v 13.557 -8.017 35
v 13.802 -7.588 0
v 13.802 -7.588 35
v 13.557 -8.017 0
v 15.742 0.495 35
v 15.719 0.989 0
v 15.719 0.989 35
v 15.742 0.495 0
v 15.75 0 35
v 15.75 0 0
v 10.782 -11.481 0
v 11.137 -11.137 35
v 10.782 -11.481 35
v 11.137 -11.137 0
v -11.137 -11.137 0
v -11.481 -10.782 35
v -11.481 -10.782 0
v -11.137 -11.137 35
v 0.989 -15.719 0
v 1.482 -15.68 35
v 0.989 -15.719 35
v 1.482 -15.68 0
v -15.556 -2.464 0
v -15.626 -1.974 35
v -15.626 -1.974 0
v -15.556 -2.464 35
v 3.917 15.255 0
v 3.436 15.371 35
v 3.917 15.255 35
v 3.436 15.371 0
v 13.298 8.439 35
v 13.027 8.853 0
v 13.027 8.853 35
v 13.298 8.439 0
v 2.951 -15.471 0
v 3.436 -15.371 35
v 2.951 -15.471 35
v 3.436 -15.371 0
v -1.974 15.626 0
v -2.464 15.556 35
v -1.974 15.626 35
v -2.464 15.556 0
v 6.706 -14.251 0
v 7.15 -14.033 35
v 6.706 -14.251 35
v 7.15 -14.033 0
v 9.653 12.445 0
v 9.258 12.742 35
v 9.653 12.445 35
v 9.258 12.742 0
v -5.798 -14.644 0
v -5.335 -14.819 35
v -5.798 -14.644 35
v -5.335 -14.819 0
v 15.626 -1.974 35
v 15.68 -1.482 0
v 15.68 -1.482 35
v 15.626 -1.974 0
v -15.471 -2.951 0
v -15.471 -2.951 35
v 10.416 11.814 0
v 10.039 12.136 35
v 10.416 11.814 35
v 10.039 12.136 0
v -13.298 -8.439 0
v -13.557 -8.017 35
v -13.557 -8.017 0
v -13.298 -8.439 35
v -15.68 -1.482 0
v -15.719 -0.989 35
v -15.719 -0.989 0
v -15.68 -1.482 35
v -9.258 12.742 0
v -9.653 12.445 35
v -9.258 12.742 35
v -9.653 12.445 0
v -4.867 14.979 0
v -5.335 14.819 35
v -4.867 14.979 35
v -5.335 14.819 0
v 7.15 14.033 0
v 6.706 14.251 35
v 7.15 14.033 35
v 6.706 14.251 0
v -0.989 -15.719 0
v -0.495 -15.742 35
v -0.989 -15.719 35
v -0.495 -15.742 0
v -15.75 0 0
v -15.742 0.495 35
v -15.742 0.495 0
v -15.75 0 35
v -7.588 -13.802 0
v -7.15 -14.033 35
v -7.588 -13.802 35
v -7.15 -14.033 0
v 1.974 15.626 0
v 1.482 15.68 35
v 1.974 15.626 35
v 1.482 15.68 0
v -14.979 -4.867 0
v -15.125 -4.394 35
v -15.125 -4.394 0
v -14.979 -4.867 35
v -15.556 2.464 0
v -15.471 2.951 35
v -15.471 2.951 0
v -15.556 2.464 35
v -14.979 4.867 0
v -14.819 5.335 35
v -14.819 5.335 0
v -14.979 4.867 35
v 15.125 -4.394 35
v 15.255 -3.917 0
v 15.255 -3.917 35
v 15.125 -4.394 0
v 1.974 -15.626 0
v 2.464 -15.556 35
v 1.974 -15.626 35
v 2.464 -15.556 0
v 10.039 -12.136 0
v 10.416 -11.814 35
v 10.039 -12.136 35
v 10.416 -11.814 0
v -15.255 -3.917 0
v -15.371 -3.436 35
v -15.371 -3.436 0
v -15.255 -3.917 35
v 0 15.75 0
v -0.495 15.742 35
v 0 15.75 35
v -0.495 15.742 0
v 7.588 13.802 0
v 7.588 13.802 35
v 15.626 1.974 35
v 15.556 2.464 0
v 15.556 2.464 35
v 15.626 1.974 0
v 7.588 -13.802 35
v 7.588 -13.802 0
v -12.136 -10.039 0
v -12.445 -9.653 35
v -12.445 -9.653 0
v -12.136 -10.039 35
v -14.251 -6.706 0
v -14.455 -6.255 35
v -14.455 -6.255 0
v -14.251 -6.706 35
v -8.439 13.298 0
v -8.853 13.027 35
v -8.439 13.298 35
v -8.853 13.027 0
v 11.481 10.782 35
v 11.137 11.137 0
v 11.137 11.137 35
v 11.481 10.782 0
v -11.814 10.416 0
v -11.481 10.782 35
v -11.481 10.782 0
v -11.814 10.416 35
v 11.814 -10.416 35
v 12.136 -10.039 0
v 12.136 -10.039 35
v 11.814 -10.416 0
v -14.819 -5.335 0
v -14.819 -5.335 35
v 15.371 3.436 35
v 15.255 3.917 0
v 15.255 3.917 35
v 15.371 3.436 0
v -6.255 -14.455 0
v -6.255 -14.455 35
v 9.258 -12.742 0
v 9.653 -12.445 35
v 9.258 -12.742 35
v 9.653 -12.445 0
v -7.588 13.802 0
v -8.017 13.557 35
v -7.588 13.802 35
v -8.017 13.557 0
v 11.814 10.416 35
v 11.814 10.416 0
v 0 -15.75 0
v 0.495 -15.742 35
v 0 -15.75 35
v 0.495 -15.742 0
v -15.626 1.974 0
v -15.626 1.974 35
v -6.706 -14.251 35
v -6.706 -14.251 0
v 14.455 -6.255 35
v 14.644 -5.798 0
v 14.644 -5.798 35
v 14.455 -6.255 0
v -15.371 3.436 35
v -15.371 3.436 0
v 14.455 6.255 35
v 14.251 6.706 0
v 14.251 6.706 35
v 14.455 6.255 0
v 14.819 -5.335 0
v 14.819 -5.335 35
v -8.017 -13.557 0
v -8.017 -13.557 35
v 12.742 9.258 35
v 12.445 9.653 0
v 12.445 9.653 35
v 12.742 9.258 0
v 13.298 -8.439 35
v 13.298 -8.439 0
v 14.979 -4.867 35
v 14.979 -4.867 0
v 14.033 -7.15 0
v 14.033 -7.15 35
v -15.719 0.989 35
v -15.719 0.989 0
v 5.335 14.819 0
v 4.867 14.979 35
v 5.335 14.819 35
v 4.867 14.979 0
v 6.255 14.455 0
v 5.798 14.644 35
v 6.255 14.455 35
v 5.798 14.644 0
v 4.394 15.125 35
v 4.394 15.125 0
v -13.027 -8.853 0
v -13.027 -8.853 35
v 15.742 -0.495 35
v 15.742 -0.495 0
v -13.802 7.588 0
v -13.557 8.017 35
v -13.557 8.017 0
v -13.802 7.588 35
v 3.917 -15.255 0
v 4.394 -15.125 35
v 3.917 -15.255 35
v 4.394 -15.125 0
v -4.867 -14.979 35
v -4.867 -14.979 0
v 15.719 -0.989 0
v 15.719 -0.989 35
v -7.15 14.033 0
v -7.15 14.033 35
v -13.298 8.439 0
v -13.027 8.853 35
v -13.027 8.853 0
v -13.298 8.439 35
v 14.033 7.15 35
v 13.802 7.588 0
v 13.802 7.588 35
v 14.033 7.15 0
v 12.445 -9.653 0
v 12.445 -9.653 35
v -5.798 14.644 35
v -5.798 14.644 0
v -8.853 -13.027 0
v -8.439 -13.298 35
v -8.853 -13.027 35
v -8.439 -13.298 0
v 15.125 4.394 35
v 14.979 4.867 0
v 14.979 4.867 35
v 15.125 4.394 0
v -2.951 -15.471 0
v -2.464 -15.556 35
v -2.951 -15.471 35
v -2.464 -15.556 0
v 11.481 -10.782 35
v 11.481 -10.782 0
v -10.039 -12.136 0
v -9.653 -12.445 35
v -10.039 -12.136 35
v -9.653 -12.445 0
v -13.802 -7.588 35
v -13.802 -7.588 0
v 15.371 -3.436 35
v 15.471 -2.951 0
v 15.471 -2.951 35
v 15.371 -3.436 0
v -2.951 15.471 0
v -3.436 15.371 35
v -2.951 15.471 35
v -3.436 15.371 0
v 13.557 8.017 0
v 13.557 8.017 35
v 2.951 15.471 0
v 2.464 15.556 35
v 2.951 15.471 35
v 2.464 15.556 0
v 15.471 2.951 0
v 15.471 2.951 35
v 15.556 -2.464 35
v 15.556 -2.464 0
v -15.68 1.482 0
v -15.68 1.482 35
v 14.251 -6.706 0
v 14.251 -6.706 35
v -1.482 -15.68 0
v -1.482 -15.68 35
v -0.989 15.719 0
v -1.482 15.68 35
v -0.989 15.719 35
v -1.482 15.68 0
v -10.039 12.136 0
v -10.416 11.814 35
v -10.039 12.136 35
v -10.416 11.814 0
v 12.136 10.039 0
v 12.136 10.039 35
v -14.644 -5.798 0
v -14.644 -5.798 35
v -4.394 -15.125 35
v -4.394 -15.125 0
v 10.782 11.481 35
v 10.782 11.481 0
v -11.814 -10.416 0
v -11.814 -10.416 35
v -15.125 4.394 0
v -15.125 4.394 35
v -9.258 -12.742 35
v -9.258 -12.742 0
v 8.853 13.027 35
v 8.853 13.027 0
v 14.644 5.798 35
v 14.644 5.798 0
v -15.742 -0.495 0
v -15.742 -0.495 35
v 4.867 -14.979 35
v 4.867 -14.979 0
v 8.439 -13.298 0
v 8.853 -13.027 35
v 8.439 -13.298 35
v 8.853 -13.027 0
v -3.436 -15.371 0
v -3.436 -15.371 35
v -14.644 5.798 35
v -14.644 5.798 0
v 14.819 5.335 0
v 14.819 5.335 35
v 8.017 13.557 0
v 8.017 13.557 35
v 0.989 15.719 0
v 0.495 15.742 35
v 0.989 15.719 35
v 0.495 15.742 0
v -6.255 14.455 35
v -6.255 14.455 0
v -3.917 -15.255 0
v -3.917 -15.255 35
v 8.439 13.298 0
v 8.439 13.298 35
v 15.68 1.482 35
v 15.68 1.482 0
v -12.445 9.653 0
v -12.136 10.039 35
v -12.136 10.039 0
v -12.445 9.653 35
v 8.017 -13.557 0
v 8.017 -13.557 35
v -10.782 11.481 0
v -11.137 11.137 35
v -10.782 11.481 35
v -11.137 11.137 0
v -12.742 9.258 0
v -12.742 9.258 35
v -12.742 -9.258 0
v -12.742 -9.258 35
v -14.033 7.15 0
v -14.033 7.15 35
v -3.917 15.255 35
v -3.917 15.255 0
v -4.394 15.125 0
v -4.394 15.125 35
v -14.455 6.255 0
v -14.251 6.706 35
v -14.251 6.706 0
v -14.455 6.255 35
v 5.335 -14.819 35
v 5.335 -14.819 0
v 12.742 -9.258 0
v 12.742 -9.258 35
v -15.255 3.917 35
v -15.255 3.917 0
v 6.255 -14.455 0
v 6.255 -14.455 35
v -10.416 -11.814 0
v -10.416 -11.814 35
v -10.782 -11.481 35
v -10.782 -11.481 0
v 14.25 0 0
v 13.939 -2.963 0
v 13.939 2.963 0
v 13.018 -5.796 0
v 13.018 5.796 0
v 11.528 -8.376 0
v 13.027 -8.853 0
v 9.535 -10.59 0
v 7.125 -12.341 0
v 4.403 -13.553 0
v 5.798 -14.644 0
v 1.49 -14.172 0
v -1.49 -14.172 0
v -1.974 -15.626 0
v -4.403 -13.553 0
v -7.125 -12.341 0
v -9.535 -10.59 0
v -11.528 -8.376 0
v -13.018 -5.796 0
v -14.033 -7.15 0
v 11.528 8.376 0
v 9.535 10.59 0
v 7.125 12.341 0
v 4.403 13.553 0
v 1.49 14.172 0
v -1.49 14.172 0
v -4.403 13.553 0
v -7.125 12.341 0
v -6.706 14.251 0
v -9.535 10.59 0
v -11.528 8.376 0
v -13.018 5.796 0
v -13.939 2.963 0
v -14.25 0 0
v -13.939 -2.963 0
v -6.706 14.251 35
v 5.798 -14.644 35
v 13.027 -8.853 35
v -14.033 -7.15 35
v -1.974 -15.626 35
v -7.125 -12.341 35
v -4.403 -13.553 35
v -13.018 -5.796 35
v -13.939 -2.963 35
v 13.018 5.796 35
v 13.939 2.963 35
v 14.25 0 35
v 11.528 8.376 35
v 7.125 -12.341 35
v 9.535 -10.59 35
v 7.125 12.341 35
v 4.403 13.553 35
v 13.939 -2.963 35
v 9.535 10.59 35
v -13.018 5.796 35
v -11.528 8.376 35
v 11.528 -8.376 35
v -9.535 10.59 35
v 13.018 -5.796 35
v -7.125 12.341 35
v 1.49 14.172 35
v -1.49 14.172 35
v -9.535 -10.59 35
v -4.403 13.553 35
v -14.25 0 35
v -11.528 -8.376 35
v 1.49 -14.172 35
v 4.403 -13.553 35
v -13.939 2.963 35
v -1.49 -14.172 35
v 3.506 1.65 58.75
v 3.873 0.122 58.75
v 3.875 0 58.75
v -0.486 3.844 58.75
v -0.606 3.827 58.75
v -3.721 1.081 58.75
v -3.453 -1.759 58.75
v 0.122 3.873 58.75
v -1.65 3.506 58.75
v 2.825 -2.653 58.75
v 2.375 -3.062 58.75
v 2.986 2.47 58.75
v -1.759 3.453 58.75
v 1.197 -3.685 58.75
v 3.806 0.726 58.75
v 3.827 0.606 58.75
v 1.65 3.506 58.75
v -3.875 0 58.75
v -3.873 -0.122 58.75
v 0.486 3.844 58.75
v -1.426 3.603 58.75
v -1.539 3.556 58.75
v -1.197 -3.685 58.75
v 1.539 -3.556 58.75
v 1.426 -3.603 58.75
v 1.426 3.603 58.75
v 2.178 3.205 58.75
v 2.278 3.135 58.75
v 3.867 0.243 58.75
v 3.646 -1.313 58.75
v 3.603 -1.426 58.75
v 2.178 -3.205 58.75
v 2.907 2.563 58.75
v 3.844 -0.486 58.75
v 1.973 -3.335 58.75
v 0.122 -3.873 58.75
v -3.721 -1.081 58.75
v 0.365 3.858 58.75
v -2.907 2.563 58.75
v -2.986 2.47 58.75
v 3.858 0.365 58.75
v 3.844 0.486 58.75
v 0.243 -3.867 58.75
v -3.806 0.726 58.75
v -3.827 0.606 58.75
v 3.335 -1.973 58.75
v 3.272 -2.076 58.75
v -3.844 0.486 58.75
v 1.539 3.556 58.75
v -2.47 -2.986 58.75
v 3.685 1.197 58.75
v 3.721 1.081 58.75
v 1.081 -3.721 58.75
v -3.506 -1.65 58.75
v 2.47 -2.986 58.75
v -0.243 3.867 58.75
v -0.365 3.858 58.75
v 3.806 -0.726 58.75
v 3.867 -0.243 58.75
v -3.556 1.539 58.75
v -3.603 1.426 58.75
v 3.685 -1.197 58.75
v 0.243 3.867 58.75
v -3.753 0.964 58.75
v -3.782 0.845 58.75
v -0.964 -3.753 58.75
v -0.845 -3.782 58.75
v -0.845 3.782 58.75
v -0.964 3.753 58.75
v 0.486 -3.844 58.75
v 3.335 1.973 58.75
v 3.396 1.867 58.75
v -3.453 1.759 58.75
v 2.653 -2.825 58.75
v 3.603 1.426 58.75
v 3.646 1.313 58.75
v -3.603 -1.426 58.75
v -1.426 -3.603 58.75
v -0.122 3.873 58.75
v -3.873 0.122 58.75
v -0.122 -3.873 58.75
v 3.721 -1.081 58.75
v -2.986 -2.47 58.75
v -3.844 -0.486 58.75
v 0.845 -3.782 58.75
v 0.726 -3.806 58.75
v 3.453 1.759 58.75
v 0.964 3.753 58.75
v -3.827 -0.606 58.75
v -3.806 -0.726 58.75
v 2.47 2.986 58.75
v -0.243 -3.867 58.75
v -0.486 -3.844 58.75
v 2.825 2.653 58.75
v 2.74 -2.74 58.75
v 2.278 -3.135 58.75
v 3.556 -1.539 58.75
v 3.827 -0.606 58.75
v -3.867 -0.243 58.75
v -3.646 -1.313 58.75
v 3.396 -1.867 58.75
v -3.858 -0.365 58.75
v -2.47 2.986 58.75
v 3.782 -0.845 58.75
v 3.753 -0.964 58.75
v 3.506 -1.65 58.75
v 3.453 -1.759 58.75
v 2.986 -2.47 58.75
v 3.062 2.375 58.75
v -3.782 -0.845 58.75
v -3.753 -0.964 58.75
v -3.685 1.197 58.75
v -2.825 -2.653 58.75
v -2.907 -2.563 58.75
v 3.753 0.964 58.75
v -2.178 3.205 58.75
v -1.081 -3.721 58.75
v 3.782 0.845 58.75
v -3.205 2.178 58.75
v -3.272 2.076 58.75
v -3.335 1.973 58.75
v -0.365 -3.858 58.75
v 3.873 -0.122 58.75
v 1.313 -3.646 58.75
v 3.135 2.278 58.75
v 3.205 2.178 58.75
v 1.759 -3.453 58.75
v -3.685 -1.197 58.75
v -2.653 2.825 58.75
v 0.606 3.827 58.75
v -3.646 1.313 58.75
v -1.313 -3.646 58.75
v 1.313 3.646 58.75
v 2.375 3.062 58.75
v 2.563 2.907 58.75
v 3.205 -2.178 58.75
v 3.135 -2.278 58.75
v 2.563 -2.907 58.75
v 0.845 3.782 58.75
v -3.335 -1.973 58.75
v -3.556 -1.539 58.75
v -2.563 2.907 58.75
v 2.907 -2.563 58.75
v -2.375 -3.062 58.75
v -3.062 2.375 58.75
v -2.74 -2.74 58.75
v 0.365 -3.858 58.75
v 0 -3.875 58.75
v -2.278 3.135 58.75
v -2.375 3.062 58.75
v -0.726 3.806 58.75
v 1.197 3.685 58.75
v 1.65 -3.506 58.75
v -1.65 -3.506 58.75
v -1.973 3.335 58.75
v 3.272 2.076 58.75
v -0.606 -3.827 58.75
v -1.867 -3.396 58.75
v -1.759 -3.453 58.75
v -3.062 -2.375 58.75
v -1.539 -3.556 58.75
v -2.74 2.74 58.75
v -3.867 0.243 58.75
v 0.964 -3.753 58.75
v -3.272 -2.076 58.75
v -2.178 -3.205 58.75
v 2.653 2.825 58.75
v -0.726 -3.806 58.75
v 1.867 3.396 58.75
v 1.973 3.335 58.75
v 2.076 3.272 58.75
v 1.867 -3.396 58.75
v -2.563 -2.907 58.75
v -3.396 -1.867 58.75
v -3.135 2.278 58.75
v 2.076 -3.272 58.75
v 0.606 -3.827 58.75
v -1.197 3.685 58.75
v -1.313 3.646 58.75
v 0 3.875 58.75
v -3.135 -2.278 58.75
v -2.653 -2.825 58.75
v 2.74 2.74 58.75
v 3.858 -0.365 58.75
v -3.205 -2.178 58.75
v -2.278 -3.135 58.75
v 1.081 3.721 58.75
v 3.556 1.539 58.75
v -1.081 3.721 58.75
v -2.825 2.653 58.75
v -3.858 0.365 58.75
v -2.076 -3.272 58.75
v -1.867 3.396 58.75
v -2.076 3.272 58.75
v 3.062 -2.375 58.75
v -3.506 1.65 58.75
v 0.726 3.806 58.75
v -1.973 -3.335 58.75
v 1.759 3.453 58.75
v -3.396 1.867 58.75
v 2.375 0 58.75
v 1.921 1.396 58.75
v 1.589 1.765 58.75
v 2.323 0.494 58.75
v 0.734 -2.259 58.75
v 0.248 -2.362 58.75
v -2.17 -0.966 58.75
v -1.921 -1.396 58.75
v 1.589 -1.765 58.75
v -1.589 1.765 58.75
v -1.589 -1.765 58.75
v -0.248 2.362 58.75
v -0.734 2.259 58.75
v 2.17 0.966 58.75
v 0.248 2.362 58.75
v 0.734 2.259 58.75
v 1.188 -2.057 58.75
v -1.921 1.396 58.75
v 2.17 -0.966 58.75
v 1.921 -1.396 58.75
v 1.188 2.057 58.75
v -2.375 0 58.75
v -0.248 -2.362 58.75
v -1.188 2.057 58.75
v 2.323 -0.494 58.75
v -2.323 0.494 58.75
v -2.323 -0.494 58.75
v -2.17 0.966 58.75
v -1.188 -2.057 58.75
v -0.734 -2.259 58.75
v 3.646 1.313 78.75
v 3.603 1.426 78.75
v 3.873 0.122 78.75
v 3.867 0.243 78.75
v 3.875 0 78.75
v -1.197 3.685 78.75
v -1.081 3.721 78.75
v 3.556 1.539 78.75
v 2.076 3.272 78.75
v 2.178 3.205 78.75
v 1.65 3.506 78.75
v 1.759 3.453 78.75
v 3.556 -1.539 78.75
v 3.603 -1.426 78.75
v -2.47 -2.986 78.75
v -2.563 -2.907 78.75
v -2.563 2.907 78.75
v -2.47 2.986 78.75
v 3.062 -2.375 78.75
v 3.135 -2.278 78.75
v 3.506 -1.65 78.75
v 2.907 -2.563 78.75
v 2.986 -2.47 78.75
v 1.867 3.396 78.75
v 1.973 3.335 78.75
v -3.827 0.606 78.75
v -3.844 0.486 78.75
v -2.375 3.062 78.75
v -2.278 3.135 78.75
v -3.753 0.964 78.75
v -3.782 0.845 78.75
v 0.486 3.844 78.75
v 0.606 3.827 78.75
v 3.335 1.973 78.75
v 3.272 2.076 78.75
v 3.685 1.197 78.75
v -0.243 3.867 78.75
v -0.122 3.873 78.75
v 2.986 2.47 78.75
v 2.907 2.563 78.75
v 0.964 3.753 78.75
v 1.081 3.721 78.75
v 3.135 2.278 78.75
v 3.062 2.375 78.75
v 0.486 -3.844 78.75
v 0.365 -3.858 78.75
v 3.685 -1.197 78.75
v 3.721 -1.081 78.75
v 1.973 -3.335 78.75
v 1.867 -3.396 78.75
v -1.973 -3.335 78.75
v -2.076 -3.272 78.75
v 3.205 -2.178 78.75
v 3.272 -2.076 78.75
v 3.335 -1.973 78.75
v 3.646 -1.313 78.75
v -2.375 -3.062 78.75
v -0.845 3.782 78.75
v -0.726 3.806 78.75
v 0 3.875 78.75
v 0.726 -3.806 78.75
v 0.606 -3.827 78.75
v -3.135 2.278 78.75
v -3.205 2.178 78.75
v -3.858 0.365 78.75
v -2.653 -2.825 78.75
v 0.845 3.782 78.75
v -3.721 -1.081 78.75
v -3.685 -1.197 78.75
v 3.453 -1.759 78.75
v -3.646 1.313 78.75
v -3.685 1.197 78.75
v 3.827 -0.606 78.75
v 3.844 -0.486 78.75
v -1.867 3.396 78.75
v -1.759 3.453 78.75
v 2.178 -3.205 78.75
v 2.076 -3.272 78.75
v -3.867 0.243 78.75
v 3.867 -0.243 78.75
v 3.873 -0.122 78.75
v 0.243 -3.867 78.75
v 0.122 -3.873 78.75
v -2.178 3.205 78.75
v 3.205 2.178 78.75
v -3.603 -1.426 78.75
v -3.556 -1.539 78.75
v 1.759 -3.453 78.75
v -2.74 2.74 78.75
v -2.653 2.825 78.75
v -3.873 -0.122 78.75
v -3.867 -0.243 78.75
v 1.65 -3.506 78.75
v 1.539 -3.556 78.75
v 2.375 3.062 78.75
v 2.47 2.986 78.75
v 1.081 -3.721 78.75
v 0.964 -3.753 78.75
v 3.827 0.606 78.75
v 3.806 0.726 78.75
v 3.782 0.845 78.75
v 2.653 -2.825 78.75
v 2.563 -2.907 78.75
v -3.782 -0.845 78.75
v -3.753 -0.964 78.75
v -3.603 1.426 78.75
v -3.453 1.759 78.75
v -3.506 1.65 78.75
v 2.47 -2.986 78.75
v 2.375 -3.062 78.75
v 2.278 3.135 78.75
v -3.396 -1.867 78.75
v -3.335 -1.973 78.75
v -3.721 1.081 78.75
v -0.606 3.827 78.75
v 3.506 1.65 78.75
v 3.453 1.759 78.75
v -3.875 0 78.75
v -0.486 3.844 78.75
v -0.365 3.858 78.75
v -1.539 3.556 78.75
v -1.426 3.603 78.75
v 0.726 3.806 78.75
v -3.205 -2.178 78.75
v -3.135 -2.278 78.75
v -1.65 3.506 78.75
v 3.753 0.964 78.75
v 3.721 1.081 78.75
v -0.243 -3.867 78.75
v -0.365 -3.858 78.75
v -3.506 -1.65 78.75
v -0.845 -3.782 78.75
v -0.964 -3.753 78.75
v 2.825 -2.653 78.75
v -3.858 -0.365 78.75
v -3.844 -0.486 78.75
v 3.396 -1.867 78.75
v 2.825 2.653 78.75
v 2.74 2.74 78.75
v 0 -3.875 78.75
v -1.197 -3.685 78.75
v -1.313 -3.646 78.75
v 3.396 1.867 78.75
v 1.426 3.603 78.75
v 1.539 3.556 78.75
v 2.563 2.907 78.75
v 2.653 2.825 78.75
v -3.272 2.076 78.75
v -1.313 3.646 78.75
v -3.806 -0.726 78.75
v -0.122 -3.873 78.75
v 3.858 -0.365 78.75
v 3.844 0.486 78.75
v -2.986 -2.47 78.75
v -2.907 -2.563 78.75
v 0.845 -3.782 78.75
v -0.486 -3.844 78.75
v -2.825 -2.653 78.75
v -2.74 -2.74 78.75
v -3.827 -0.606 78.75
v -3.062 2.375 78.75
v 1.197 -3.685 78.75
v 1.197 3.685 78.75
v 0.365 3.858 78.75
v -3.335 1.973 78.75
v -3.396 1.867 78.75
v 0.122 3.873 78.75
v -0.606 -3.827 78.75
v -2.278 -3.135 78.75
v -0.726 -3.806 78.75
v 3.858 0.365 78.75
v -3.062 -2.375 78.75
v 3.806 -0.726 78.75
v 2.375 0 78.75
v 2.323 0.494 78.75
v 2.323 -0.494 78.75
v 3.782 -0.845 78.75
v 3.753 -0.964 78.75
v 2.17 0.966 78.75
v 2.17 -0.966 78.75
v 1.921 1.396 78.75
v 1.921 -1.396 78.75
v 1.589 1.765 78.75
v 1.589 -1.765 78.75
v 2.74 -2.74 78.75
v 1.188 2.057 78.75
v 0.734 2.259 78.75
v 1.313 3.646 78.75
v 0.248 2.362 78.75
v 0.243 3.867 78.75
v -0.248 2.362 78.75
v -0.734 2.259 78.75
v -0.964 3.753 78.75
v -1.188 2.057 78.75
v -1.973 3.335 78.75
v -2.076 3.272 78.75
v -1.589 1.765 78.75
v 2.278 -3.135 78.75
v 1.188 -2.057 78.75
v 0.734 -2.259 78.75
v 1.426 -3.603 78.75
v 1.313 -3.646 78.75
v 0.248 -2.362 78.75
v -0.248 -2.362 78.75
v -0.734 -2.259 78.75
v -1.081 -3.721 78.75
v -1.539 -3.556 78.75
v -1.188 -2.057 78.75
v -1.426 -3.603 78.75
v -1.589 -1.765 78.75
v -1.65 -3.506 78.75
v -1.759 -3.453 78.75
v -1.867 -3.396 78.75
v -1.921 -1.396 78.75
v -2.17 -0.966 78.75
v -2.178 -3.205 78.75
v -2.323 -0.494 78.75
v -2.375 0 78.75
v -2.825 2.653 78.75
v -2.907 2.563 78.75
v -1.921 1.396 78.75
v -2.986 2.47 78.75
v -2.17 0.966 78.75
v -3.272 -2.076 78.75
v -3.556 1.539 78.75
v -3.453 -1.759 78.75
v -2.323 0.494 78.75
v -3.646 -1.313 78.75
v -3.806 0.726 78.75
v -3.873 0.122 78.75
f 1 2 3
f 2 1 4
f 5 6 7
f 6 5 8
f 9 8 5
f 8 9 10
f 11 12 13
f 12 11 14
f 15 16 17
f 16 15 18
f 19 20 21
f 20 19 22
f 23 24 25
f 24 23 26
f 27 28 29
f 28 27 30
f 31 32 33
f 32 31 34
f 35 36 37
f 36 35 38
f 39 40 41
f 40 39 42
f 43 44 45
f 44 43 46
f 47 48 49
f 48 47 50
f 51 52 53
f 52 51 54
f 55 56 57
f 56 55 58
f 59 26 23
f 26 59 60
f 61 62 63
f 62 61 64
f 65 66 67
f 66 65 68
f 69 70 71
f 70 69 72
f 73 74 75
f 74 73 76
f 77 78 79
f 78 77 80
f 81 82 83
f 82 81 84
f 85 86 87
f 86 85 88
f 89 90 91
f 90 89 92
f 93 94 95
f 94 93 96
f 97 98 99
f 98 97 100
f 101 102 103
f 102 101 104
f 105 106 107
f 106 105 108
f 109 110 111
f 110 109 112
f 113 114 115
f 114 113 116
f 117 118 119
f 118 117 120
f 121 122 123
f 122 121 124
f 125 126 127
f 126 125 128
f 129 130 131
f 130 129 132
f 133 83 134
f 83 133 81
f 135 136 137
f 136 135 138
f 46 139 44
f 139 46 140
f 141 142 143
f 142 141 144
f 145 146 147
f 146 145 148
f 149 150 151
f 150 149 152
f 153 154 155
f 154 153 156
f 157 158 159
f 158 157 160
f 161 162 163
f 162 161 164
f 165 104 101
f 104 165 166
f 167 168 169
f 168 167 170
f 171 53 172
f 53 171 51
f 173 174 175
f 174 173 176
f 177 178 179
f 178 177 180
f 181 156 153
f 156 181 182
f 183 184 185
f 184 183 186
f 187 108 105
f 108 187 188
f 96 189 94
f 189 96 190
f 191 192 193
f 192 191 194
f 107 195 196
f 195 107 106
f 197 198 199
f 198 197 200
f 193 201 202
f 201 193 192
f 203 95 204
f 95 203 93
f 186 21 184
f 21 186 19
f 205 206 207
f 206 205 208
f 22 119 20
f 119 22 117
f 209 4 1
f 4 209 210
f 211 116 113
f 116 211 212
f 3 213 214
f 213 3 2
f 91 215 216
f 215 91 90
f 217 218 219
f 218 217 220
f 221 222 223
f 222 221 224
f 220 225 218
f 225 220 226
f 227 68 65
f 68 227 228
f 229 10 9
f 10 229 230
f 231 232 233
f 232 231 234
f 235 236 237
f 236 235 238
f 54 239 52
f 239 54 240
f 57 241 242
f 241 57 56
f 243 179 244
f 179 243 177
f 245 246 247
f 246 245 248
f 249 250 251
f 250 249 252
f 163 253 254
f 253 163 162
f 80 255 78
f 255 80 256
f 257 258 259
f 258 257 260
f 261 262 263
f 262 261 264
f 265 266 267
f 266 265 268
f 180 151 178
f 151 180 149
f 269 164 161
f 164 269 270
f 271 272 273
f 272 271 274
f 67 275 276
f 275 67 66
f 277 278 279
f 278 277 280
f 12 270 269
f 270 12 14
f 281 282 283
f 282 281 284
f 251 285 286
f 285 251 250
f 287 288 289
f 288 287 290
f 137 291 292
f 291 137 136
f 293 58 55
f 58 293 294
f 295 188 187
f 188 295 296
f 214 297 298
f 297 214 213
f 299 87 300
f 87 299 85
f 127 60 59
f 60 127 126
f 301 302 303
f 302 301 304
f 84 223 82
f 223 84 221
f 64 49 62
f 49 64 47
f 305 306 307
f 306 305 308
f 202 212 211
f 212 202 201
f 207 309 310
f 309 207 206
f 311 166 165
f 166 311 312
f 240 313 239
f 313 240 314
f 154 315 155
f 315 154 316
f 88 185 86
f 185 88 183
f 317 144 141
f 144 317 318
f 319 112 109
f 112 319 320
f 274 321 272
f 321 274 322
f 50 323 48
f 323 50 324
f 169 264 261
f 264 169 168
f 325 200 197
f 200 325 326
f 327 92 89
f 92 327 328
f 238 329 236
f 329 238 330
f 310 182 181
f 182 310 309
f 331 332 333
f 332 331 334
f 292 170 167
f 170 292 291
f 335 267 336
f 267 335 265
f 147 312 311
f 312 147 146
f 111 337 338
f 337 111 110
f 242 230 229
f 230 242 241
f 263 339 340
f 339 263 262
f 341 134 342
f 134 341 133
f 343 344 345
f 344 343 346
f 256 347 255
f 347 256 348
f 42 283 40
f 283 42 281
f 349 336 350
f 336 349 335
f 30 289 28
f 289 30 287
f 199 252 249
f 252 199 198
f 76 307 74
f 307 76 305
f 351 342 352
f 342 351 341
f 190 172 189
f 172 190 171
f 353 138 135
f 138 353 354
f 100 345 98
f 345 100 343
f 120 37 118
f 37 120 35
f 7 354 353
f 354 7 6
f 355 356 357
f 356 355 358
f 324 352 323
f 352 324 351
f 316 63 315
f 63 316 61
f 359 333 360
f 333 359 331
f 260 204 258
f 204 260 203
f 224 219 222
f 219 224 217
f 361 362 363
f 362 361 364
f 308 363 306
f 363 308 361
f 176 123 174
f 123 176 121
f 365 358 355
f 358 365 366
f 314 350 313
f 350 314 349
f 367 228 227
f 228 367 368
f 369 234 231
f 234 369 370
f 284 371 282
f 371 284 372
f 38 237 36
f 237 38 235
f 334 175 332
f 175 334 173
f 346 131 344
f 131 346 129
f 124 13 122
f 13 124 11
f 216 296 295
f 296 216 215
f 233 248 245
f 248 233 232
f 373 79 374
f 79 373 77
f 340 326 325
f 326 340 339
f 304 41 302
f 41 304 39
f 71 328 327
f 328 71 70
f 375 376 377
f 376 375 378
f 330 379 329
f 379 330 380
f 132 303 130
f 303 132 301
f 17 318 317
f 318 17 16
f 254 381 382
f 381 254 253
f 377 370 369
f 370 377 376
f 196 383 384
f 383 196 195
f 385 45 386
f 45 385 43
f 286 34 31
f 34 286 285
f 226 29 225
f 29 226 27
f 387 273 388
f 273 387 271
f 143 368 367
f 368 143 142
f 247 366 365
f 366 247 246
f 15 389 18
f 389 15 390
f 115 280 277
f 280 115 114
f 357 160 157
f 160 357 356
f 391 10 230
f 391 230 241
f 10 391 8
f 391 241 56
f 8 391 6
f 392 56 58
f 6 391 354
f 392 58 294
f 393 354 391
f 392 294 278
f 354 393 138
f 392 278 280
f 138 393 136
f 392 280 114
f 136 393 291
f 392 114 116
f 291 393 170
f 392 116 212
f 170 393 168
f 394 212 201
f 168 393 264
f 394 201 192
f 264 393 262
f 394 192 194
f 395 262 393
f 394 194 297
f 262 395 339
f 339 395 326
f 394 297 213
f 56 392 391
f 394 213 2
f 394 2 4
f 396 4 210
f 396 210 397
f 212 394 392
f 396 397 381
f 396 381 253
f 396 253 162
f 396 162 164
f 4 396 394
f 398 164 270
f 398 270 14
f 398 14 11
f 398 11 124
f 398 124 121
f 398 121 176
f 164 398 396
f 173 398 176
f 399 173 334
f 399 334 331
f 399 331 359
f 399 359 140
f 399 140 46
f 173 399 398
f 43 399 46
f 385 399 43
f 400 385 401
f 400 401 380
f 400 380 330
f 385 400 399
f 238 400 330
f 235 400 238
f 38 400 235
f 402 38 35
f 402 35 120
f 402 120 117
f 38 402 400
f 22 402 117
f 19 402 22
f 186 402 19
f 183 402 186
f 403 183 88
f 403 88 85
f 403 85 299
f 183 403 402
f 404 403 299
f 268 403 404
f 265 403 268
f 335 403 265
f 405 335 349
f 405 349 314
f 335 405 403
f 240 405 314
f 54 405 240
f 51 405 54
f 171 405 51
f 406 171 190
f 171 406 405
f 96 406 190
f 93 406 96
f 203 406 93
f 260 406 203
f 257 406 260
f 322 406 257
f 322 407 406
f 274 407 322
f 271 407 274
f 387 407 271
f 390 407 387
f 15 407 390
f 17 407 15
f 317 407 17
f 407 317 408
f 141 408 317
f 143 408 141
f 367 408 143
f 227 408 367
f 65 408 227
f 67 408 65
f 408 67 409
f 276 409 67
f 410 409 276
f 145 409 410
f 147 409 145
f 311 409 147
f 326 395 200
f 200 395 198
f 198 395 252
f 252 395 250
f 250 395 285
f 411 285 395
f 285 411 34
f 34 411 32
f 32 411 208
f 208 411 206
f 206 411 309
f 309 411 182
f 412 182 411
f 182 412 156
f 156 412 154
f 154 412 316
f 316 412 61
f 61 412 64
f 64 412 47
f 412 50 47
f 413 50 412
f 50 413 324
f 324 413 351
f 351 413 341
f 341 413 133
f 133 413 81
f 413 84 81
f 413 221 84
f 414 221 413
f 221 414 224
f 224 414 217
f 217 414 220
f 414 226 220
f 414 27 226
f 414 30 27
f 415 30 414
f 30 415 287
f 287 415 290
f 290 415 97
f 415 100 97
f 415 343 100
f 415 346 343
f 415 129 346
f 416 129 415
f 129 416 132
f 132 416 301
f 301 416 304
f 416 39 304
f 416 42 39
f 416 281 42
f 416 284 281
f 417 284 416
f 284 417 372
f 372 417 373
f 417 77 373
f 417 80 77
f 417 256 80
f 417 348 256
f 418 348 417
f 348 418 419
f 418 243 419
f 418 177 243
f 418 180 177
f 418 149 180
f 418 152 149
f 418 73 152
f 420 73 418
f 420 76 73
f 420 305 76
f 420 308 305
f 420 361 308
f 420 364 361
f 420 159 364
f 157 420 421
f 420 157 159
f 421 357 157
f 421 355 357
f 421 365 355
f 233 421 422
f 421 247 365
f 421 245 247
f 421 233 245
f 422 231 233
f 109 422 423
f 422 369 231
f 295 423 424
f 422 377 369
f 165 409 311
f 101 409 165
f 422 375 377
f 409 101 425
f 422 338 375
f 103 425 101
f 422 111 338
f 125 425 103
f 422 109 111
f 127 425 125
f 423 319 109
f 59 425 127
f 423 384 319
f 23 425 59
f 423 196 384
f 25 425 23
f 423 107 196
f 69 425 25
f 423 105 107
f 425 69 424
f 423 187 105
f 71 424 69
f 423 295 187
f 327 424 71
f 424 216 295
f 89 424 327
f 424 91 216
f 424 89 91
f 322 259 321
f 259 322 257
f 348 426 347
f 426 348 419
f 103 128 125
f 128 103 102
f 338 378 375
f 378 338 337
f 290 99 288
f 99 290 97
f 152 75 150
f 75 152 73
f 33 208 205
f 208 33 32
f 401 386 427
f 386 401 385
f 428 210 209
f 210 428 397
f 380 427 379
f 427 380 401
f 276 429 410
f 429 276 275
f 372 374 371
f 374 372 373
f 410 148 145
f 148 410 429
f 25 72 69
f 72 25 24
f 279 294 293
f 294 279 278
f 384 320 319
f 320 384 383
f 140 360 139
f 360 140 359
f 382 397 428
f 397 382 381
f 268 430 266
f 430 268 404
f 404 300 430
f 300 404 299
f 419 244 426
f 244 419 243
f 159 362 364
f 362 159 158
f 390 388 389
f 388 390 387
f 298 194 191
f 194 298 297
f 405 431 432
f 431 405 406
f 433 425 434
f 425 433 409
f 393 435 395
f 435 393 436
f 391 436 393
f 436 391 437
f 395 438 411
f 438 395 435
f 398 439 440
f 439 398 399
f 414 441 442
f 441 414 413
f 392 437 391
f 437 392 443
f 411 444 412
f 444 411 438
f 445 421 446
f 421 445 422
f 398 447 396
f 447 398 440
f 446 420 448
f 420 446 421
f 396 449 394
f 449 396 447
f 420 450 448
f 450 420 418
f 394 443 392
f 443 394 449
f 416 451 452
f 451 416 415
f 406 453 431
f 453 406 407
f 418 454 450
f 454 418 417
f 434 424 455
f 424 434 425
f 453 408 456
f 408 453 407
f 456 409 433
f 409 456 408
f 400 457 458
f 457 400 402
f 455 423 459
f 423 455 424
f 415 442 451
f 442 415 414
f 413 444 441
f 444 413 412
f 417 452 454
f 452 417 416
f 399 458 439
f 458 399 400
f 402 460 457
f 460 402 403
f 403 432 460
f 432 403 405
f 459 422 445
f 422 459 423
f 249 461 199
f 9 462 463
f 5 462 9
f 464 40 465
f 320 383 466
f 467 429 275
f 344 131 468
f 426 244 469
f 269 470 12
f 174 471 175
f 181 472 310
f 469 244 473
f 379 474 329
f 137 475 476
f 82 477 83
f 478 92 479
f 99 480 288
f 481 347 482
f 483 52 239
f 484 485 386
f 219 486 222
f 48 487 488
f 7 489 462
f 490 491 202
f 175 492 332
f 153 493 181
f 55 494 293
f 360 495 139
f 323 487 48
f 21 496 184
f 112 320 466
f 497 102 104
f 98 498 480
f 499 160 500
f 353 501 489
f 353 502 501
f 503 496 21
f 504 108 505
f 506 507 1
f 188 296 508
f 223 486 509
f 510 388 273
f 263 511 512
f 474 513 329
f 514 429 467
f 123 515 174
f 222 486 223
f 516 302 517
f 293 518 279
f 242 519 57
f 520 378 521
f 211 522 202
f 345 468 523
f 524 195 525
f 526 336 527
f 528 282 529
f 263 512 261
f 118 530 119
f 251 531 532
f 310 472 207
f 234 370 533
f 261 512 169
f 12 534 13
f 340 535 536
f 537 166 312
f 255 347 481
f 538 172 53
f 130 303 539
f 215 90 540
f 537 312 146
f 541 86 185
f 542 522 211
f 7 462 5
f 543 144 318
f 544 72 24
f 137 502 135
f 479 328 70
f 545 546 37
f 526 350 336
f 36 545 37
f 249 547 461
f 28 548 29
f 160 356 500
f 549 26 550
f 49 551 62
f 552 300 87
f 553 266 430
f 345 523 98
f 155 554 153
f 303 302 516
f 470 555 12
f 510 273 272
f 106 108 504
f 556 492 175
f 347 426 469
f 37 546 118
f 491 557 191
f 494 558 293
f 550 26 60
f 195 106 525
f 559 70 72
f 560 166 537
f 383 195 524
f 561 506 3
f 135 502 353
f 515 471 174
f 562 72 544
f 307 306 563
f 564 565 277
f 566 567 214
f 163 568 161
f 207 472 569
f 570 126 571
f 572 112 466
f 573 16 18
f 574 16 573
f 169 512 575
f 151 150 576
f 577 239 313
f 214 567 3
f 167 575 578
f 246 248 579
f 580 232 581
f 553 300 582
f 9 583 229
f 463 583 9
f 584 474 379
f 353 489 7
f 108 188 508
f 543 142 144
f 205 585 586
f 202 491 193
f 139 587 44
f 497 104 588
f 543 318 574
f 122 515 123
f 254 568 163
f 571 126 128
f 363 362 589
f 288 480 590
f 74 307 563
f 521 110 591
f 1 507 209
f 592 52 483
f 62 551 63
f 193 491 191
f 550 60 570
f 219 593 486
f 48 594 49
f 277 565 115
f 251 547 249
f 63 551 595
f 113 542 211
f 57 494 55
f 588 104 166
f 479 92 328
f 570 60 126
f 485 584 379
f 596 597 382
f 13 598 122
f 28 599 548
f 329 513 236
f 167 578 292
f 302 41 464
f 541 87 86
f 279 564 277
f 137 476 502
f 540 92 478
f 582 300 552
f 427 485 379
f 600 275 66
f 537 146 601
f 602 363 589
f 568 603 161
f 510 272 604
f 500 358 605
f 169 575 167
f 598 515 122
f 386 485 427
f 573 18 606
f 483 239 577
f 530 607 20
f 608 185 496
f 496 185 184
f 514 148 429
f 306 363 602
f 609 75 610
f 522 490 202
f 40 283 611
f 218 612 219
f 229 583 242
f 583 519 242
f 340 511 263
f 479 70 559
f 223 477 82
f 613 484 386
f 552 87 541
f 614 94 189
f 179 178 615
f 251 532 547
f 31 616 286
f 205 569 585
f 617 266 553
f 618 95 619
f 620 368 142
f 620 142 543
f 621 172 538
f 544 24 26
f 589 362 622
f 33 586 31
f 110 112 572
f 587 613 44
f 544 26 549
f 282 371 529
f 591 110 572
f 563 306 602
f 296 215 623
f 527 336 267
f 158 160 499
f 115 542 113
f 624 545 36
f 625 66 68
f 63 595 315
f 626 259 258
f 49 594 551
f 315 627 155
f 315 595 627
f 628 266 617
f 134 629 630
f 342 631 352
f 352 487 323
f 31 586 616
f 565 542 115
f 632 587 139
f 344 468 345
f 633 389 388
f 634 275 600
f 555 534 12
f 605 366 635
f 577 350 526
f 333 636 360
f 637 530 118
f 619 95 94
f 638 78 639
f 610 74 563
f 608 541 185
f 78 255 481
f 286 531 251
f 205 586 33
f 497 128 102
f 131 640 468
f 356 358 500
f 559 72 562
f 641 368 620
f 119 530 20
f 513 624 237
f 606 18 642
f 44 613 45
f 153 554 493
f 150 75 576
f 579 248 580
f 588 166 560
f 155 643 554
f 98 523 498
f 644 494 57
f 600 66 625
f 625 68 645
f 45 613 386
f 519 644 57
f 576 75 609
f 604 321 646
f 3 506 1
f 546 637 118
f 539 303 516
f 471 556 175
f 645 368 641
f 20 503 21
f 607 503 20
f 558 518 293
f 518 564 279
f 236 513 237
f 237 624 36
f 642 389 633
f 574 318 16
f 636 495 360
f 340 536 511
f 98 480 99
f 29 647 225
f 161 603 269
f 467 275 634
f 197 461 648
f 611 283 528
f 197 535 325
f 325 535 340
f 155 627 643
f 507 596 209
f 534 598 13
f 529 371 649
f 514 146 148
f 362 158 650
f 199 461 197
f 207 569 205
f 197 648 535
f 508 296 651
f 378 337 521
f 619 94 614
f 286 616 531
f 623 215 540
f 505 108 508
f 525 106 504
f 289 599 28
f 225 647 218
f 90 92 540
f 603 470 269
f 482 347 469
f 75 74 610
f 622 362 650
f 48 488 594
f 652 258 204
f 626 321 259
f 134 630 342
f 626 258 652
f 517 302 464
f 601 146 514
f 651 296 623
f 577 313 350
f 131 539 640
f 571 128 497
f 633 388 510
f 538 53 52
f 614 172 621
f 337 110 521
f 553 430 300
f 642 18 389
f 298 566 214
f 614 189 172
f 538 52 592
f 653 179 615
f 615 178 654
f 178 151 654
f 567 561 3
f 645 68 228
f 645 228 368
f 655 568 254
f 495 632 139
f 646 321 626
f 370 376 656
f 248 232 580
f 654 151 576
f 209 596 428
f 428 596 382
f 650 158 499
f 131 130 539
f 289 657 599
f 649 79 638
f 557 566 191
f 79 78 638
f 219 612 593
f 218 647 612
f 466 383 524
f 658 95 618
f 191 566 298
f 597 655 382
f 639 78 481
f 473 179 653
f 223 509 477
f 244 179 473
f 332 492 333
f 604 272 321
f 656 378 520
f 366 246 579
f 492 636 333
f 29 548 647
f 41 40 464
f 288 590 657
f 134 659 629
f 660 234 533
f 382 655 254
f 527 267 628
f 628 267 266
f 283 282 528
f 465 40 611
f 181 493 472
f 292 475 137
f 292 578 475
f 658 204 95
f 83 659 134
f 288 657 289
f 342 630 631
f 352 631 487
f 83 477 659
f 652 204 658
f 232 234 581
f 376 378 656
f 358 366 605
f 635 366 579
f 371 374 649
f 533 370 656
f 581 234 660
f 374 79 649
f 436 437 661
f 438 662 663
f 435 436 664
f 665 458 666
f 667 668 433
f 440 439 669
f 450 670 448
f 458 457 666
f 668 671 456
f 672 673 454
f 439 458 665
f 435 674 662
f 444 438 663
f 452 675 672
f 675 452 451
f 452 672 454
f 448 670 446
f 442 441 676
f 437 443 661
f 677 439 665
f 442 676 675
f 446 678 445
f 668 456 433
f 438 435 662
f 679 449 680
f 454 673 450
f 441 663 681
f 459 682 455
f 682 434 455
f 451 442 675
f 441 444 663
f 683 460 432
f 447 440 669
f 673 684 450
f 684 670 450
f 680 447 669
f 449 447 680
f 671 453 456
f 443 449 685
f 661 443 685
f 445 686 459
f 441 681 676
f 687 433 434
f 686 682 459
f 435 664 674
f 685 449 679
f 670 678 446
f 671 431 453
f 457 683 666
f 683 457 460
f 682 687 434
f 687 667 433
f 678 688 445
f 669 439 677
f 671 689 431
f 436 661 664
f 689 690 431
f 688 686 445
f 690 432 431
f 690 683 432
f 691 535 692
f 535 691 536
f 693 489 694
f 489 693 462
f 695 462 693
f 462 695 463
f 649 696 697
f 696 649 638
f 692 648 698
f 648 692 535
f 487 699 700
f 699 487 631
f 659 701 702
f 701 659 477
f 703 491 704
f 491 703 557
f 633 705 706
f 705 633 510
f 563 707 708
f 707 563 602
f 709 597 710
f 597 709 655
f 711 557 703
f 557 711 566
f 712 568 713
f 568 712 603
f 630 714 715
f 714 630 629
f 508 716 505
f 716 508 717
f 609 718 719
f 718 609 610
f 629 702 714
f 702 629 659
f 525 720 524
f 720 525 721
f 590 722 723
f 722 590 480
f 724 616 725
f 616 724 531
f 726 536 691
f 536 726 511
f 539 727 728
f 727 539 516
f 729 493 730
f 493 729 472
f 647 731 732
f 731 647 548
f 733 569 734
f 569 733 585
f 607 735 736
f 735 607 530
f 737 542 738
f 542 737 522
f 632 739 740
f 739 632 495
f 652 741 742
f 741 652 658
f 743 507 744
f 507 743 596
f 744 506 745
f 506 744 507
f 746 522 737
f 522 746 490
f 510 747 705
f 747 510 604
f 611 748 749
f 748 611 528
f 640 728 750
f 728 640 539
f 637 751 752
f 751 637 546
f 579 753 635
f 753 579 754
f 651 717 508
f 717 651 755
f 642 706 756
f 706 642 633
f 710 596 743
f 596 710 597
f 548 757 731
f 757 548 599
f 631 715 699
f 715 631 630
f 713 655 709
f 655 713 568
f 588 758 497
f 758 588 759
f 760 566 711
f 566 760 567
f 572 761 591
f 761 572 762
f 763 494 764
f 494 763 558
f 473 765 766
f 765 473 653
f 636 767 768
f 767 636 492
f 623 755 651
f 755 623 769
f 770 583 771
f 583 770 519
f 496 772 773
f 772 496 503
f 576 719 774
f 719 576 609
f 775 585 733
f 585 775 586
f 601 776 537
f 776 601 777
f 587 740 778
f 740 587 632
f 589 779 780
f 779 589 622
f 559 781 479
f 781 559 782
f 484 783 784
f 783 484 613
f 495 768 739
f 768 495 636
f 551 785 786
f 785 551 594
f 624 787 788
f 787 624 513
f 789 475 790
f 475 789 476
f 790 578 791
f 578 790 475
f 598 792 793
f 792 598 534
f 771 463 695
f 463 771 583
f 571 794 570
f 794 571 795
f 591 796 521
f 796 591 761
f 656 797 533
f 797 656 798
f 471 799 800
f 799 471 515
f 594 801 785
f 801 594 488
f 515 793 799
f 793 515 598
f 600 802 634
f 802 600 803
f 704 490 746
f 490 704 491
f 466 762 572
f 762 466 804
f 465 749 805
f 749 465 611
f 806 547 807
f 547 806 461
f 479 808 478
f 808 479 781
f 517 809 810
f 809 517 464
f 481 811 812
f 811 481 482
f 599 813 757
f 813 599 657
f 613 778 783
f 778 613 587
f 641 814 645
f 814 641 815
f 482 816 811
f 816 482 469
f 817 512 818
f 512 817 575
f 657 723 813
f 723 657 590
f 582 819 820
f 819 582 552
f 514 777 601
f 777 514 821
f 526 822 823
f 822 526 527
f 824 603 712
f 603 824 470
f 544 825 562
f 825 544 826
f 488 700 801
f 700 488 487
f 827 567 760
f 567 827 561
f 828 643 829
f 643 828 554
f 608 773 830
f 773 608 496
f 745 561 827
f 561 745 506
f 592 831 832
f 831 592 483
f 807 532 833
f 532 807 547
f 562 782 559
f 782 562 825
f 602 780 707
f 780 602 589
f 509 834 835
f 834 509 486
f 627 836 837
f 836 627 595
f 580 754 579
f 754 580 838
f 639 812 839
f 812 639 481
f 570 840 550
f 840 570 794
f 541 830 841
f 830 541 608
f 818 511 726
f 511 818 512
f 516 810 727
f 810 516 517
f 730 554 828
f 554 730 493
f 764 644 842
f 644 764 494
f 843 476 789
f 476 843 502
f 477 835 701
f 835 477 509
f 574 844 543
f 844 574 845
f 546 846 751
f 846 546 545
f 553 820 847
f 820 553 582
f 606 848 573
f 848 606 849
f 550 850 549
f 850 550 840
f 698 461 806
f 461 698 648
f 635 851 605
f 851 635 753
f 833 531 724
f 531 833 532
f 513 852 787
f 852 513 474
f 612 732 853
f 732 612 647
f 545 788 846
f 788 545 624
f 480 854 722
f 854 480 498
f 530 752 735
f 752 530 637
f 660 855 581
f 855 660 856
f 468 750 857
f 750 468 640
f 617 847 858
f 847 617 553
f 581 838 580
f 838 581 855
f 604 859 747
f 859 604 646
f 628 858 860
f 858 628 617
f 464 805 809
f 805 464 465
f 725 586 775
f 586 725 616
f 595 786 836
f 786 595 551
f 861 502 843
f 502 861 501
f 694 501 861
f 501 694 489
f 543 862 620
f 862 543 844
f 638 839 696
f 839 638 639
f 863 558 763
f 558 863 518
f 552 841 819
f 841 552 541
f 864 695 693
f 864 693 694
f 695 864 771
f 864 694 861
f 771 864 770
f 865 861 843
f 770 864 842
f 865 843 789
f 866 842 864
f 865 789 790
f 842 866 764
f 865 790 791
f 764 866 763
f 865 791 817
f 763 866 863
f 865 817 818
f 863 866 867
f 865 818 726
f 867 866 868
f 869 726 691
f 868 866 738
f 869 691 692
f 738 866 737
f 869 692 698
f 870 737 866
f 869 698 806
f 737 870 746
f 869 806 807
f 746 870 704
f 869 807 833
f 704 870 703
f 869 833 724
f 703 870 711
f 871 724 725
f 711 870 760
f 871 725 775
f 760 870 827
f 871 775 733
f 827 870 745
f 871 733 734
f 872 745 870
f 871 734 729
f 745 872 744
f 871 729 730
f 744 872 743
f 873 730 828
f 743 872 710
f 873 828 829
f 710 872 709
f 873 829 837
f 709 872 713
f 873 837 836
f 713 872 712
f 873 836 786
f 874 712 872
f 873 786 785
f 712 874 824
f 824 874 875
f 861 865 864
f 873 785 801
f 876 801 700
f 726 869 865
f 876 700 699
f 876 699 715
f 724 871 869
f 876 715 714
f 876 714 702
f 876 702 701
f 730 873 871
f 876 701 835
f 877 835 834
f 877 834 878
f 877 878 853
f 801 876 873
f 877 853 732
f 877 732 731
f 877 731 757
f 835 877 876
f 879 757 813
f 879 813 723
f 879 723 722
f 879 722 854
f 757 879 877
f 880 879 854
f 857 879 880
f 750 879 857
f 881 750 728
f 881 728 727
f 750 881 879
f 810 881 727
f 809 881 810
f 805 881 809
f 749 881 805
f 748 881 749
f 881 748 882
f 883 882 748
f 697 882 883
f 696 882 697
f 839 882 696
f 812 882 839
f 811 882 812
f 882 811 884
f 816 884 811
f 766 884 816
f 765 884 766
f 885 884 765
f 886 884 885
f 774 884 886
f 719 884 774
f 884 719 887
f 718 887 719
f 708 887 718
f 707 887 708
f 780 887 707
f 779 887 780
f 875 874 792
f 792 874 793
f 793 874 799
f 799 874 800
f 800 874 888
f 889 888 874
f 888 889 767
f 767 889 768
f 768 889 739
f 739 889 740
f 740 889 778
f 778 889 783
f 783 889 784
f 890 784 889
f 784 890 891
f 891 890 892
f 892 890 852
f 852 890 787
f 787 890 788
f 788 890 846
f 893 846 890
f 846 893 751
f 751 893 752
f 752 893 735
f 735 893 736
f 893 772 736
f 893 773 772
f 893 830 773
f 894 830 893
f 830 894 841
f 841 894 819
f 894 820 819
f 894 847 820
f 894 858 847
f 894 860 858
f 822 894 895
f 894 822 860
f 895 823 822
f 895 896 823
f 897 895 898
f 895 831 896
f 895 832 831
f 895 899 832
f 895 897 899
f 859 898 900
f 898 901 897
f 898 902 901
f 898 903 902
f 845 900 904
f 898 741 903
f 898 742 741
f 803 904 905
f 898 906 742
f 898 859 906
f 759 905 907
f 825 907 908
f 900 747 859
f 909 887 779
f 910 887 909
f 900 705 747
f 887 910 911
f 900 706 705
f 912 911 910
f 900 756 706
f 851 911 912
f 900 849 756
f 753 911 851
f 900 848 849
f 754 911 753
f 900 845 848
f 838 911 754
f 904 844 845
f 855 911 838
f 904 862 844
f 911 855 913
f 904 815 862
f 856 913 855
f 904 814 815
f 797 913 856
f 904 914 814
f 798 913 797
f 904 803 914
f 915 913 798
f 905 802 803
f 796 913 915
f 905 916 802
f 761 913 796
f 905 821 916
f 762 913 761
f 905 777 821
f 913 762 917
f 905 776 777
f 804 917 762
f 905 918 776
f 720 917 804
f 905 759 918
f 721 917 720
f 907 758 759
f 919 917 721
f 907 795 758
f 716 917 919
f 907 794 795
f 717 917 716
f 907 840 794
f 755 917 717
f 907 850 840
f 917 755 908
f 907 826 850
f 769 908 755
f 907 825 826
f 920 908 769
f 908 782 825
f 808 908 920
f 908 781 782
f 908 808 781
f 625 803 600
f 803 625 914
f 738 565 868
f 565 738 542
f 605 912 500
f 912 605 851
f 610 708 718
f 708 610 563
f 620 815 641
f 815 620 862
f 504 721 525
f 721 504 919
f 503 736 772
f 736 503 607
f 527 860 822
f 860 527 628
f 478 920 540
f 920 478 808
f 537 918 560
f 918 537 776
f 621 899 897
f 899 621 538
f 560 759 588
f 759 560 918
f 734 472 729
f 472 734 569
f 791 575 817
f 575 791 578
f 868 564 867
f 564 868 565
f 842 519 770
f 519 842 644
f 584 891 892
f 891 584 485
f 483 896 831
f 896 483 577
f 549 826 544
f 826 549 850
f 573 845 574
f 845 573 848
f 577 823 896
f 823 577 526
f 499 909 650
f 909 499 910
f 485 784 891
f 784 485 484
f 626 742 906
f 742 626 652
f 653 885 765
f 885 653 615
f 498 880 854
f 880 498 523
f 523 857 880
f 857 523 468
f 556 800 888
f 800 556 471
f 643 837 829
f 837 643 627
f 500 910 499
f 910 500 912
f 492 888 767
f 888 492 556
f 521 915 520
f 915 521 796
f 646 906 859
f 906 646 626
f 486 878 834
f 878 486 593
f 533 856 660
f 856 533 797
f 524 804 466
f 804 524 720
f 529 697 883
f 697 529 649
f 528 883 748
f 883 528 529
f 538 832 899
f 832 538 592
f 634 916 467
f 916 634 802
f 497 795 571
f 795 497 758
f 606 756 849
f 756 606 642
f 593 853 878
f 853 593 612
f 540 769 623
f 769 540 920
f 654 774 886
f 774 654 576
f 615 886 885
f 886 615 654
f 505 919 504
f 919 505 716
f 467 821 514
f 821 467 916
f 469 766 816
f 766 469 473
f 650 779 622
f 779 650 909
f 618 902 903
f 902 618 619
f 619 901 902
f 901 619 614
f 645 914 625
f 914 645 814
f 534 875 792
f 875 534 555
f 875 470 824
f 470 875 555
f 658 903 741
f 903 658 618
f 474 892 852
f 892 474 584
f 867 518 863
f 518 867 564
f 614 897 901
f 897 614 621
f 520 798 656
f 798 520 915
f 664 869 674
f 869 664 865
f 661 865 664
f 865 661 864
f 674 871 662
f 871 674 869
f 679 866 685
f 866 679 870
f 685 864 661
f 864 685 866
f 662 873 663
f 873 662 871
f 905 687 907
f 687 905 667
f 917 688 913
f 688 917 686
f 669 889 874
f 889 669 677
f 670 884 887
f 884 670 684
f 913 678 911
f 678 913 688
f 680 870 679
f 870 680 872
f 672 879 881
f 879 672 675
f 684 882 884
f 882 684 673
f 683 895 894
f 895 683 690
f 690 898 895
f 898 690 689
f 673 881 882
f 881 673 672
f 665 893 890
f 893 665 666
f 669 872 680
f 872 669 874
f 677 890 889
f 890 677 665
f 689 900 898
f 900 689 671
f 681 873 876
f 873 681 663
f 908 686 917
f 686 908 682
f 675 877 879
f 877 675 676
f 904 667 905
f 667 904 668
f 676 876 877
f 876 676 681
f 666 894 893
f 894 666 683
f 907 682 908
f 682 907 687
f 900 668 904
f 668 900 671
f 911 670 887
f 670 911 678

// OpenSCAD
wall = 1.5;
low_fi = 7.75;
high_fi = 31.5;
delta_fi = high_fi - low_fi;
w2 = 2*wall;

// lower adapter
difference()
{
  cylinder(d=high_fi, h=35, $fn=200);
  cylinder(d=high_fi-w2, h=35);
}
translate([0,0,35])
{
  // center reduction
  difference()
  {
    cylinder(d1=high_fi, d2=low_fi, h=delta_fi, $fn=200);
    cylinder(d1=high_fi-w2, d2=low_fi-w2, h=delta_fi);
  }
  // top adapter
  translate([0,0,delta_fi])
    difference()
    {
      cylinder(d=low_fi, h=20, $fn=200);
      cylinder(d=low_fi-w2, h=20, $fn=30);
    }
}
